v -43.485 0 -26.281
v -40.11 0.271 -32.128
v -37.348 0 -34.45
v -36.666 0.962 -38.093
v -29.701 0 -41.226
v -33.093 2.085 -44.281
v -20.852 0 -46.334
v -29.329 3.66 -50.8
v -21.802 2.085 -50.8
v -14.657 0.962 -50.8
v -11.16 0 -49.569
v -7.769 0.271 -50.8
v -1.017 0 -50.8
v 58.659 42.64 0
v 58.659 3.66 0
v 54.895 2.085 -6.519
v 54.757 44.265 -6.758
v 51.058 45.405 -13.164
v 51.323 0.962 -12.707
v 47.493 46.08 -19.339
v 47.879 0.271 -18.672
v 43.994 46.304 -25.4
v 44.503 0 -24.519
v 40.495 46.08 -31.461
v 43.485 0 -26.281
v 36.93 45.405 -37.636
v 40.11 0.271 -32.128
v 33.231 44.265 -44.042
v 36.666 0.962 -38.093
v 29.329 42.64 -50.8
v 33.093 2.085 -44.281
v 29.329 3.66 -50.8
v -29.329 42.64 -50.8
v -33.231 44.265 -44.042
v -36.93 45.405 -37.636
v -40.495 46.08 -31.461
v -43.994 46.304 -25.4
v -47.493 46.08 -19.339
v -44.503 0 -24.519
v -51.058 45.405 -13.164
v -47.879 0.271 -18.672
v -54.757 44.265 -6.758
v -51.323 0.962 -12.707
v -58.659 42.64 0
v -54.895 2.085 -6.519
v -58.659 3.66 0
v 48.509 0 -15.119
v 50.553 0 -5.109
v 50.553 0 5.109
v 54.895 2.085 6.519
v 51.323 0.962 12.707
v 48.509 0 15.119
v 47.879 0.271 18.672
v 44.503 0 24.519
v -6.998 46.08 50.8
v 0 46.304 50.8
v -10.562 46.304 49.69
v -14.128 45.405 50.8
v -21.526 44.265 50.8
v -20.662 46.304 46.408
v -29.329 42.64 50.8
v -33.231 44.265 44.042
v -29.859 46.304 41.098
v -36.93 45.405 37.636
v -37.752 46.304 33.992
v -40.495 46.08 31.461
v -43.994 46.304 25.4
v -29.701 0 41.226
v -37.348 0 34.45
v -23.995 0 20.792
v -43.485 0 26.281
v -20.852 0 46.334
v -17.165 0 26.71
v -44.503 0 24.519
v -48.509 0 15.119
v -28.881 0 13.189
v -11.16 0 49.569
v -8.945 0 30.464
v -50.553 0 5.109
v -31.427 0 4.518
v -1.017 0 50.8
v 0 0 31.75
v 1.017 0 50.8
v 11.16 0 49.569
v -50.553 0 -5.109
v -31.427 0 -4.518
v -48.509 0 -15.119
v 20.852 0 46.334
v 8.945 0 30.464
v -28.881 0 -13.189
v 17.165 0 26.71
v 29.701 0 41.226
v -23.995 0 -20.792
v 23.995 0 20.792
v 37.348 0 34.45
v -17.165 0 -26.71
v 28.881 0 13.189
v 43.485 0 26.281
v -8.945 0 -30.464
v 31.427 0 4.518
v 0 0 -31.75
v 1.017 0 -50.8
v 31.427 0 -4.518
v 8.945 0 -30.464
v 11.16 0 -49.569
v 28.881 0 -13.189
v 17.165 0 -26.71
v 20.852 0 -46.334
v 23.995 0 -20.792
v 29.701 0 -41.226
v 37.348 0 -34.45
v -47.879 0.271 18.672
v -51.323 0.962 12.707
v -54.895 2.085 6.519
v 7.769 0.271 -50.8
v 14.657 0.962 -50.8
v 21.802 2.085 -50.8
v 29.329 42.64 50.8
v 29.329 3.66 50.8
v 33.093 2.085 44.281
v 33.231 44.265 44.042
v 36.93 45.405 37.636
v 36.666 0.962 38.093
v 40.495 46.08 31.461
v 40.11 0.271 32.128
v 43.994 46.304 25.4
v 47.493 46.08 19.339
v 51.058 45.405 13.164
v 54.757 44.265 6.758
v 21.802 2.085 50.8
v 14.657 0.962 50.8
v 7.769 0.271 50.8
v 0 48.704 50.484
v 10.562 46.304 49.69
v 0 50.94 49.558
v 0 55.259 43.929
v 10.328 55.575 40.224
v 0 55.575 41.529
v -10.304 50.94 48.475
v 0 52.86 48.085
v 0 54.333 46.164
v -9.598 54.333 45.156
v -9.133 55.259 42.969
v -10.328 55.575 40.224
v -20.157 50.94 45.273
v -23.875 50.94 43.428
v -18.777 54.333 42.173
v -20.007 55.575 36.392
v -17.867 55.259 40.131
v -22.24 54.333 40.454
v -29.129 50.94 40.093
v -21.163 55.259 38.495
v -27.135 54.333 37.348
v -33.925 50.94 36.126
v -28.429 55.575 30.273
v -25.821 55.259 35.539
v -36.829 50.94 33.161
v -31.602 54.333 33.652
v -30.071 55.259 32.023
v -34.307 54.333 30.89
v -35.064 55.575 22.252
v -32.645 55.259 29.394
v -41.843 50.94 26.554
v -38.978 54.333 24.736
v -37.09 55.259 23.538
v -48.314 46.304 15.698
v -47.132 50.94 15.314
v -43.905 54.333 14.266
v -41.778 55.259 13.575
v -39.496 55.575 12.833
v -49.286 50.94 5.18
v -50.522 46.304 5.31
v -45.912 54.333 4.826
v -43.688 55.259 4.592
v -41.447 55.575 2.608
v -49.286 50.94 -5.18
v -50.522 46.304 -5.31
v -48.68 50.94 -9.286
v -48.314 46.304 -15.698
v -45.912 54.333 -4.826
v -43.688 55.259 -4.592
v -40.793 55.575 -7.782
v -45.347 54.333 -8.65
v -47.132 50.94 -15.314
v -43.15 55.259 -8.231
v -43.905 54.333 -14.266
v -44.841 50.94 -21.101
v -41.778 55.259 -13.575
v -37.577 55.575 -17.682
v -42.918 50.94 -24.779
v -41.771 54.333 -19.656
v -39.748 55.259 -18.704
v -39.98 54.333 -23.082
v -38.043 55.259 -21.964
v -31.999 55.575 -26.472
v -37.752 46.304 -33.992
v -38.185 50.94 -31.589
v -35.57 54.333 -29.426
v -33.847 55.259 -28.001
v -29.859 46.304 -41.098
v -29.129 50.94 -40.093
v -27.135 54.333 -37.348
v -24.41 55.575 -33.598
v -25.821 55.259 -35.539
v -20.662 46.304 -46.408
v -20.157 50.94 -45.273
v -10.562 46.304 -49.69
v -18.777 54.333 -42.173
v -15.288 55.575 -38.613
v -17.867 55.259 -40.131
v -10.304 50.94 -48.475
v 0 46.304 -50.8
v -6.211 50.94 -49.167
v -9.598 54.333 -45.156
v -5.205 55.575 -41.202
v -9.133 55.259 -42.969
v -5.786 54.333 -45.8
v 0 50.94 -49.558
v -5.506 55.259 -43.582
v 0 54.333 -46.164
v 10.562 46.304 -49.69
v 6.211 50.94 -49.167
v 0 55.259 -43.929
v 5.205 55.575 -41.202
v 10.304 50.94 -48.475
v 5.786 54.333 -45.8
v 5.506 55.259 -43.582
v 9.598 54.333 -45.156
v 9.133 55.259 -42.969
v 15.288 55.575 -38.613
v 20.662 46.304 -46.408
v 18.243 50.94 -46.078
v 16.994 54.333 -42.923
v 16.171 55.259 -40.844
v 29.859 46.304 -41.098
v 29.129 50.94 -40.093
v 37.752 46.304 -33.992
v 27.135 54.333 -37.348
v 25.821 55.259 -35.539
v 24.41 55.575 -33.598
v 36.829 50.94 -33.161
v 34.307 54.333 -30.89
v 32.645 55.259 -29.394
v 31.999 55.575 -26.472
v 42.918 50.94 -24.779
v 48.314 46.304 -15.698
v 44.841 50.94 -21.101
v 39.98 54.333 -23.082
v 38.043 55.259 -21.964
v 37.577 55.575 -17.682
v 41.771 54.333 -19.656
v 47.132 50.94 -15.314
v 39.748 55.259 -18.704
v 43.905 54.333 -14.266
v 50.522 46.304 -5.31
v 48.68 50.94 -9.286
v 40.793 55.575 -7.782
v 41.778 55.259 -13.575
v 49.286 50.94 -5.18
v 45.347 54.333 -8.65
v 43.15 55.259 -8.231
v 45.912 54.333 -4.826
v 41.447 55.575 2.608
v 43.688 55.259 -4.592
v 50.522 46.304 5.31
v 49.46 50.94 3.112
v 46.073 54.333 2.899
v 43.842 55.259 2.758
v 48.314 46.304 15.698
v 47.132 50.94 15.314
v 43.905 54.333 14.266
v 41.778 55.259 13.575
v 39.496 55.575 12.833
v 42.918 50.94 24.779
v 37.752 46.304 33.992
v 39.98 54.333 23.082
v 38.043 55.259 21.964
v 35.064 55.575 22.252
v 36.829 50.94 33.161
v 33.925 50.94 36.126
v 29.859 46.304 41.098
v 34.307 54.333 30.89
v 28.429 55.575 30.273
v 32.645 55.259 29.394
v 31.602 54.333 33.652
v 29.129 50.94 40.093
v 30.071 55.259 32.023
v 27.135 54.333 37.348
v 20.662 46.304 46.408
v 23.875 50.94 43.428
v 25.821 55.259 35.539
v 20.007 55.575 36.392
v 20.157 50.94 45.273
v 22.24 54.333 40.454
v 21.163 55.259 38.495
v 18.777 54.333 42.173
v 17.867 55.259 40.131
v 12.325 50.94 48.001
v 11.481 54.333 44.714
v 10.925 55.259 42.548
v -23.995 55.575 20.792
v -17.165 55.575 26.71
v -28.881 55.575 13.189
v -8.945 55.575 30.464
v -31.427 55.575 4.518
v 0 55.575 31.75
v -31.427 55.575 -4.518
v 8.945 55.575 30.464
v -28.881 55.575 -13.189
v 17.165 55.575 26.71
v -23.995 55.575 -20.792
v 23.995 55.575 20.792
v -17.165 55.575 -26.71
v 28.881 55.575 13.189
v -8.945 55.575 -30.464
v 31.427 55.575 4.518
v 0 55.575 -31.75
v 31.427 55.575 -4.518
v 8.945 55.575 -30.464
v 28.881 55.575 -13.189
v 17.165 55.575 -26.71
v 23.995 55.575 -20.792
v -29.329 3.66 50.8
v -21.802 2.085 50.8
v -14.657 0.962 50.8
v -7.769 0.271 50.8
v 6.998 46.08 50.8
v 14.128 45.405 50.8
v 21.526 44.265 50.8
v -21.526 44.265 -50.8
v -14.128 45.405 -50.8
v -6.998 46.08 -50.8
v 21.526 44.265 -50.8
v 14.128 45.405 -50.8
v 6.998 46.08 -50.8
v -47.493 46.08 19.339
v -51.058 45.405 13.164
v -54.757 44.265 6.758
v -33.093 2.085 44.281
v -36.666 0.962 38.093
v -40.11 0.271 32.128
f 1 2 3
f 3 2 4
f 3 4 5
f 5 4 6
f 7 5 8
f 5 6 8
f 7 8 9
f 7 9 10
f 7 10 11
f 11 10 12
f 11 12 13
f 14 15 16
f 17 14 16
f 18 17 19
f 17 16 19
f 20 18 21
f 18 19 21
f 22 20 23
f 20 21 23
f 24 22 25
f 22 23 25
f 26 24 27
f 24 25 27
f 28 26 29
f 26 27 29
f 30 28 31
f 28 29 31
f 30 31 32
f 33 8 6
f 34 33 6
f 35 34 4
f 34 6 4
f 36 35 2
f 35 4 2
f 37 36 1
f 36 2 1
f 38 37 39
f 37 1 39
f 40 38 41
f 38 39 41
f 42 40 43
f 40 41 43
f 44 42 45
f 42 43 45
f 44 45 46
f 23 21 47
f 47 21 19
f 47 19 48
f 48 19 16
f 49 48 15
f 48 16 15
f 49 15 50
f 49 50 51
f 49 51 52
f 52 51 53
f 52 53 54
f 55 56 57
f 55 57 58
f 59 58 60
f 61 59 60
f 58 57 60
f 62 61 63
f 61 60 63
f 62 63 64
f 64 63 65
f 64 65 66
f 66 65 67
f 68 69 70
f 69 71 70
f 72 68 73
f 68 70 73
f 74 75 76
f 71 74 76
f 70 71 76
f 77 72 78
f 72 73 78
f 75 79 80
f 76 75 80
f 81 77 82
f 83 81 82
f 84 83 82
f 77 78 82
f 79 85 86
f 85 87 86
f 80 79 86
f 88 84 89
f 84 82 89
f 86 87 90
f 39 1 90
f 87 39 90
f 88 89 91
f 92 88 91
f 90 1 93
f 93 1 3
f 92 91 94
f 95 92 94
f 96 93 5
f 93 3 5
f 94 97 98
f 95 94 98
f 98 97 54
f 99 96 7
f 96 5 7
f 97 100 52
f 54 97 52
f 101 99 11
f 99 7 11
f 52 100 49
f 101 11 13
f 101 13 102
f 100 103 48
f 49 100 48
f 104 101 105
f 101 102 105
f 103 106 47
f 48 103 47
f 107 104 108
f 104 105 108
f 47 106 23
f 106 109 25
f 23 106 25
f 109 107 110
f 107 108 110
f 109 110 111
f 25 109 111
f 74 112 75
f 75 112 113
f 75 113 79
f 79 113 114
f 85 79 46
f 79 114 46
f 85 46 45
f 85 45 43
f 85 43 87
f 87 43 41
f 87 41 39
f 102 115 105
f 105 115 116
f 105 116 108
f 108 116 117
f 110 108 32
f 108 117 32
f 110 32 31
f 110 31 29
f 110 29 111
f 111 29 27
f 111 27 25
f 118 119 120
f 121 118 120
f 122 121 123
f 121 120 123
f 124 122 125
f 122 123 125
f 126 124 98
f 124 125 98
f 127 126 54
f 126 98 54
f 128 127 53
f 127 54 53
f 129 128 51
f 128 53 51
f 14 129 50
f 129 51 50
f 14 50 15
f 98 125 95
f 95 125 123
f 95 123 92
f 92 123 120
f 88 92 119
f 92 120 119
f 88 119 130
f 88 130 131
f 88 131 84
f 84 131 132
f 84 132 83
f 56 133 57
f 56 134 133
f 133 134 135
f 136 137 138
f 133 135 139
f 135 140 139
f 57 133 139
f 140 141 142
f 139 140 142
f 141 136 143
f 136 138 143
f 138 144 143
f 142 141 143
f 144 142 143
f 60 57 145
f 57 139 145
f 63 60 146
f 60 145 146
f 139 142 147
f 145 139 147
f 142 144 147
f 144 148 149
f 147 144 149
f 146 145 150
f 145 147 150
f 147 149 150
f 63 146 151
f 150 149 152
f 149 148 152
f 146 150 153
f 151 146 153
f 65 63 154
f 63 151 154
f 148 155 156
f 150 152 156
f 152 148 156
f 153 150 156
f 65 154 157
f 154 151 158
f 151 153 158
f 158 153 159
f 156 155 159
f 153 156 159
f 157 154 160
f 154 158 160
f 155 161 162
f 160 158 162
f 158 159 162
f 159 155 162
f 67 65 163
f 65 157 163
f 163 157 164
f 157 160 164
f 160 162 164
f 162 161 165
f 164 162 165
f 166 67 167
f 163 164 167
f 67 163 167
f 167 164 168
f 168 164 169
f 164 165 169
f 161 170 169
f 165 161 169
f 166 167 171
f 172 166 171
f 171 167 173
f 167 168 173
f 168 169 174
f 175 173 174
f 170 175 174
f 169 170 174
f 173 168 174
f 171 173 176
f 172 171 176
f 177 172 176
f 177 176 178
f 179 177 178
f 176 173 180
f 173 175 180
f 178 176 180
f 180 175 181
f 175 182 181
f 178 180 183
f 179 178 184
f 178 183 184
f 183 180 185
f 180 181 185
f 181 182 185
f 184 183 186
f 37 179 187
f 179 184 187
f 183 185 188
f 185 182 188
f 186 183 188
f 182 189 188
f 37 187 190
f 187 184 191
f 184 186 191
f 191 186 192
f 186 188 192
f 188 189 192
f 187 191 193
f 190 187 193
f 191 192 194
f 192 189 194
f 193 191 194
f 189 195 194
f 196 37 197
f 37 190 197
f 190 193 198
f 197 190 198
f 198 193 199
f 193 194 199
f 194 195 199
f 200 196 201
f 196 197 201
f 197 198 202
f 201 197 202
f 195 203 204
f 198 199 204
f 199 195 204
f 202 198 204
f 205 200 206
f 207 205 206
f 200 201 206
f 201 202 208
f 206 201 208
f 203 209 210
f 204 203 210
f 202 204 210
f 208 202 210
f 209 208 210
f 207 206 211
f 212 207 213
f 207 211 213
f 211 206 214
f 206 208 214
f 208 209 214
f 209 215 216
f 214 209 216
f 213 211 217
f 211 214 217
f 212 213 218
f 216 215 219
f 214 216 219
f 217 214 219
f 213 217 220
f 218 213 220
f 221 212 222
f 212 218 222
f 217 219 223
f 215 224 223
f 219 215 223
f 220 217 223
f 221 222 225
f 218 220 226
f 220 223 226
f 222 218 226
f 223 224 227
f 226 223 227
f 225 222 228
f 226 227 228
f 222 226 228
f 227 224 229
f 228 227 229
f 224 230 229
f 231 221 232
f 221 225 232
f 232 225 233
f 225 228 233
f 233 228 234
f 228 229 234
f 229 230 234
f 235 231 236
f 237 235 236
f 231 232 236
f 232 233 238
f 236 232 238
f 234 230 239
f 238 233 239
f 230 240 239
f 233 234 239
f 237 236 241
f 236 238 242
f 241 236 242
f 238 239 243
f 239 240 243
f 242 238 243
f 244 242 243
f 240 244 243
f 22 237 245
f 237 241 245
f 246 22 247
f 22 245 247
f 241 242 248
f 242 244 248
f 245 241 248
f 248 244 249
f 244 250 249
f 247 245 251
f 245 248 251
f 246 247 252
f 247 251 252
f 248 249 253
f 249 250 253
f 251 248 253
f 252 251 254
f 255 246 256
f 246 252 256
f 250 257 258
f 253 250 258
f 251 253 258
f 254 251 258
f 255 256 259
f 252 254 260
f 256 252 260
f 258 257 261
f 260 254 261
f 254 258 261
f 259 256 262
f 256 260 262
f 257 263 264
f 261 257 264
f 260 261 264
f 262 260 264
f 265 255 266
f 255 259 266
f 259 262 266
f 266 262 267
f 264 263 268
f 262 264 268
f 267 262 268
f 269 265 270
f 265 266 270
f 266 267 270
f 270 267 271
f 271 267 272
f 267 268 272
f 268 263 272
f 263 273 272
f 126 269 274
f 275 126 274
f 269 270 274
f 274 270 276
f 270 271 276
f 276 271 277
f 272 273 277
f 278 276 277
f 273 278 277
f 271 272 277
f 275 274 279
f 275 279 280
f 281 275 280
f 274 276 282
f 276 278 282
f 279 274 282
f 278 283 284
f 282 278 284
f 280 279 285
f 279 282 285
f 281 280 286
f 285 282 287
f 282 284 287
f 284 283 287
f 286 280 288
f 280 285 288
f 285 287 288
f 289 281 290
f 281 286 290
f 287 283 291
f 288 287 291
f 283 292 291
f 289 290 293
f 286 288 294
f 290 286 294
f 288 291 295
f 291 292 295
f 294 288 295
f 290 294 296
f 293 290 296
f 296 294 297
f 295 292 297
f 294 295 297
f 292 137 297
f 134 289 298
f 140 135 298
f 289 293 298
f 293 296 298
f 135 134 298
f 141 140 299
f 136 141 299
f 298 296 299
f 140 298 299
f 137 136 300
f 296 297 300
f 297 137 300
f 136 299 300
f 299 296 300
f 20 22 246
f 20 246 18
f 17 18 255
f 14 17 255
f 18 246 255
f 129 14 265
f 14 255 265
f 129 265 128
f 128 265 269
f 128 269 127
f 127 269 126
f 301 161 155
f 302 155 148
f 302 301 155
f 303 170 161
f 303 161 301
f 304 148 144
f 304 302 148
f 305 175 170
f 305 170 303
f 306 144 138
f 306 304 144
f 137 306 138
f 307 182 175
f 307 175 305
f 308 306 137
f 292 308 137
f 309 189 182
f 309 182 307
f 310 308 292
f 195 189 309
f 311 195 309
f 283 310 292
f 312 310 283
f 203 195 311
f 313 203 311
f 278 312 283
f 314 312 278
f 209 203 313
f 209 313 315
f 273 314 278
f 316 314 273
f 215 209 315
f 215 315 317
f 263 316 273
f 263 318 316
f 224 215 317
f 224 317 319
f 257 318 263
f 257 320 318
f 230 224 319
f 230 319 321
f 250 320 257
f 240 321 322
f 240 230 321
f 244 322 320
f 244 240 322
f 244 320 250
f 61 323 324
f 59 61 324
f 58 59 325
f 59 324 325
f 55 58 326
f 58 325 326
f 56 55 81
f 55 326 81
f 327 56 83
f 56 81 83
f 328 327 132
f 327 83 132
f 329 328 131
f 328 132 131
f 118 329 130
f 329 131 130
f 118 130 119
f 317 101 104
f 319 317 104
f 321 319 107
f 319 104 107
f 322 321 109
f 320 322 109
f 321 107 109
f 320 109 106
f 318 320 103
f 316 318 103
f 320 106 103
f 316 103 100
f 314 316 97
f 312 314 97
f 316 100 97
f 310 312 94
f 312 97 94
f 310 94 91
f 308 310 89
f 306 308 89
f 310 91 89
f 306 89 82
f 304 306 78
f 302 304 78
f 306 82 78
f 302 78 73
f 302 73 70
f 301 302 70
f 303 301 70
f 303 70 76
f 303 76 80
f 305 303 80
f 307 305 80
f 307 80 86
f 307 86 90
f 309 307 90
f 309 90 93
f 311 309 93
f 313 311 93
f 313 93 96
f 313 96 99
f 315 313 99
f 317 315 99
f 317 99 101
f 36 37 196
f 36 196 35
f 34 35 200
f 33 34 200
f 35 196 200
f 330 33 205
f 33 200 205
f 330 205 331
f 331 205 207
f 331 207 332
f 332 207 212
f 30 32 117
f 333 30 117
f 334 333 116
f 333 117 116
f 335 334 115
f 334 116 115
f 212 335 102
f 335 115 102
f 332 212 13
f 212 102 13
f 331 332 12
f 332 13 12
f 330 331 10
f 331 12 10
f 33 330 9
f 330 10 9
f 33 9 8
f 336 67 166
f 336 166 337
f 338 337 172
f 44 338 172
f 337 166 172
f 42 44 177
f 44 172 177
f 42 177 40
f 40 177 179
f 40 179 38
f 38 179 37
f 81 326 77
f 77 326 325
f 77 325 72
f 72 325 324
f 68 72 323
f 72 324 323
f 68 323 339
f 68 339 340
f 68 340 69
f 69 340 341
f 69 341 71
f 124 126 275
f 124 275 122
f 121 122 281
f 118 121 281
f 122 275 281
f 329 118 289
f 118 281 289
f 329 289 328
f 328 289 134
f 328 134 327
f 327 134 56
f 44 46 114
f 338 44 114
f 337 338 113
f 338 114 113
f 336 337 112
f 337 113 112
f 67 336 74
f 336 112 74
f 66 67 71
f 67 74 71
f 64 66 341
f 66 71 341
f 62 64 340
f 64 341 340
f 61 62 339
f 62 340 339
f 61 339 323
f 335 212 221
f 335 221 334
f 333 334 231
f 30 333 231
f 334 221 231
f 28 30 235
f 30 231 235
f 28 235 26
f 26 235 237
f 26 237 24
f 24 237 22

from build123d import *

# Parameters (mm, degrees)
BASE_EXTRUDE_DEPTH = 55.5752
SKETCH2_R          = 31.75
CUT_EXTRUDE1_DEPTH = 96.446823878


with BuildPart() as part:
    # Sketch1 → Base-Extrude (new body)
    with BuildSketch(Plane(origin=(0, 0, 0), x_dir=(1, 0, 0), z_dir=(0, 1, 0))):
        Polygon((58.65878735, 0), (29.329393675, 50.8), (-29.329393675, 50.8), (-58.65878735, 0), (-29.329393675, -50.8), (29.329393675, -50.8), align=None)
    extrude(amount=BASE_EXTRUDE_DEPTH)

    # Sketch2 → Cut-Extrude1 (cut, through all)
    with BuildSketch(Plane(origin=(0, 0, 0), x_dir=(-1, 0, 0), z_dir=(0, -1, 0))):
        Circle(SKETCH2_R)
    extrude(amount=-CUT_EXTRUDE1_DEPTH, mode=Mode.SUBTRACT)

    # Sketch10 → Cut-Revolve3 (revolve, cut)
    with BuildSketch(Plane.XY):
        with BuildLine():
            Line((0, 56.8452), (59.9186, 56.8452))
            Line((59.9186, 56.8452), (59.9186, -1.27))
            Line((59.9186, -1.27), (0, -1.27))
            Line((0, -1.27), (0, 0))
            Line((0, 0), (50.81018735, 0))
            Line((50.81018735, 0), (58.65878735, 3.659862286))
            Line((58.65878735, 3.659862286), (58.65878735, 42.639587275))
            Line((58.65878735, 42.639587275), (50.8, 46.3042))
            ThreePointArc((50.8, 46.3042), (48.084586968, 52.859786968), (41.529, 55.5752))
            Line((41.529, 55.5752), (0, 55.5752))
            Line((0, 55.5752), (0, 56.8452))
        make_face()
    revolve(axis=Axis((0, 55.5752, 0), (0, -1, 0)), mode=Mode.SUBTRACT)


solid = part.part
